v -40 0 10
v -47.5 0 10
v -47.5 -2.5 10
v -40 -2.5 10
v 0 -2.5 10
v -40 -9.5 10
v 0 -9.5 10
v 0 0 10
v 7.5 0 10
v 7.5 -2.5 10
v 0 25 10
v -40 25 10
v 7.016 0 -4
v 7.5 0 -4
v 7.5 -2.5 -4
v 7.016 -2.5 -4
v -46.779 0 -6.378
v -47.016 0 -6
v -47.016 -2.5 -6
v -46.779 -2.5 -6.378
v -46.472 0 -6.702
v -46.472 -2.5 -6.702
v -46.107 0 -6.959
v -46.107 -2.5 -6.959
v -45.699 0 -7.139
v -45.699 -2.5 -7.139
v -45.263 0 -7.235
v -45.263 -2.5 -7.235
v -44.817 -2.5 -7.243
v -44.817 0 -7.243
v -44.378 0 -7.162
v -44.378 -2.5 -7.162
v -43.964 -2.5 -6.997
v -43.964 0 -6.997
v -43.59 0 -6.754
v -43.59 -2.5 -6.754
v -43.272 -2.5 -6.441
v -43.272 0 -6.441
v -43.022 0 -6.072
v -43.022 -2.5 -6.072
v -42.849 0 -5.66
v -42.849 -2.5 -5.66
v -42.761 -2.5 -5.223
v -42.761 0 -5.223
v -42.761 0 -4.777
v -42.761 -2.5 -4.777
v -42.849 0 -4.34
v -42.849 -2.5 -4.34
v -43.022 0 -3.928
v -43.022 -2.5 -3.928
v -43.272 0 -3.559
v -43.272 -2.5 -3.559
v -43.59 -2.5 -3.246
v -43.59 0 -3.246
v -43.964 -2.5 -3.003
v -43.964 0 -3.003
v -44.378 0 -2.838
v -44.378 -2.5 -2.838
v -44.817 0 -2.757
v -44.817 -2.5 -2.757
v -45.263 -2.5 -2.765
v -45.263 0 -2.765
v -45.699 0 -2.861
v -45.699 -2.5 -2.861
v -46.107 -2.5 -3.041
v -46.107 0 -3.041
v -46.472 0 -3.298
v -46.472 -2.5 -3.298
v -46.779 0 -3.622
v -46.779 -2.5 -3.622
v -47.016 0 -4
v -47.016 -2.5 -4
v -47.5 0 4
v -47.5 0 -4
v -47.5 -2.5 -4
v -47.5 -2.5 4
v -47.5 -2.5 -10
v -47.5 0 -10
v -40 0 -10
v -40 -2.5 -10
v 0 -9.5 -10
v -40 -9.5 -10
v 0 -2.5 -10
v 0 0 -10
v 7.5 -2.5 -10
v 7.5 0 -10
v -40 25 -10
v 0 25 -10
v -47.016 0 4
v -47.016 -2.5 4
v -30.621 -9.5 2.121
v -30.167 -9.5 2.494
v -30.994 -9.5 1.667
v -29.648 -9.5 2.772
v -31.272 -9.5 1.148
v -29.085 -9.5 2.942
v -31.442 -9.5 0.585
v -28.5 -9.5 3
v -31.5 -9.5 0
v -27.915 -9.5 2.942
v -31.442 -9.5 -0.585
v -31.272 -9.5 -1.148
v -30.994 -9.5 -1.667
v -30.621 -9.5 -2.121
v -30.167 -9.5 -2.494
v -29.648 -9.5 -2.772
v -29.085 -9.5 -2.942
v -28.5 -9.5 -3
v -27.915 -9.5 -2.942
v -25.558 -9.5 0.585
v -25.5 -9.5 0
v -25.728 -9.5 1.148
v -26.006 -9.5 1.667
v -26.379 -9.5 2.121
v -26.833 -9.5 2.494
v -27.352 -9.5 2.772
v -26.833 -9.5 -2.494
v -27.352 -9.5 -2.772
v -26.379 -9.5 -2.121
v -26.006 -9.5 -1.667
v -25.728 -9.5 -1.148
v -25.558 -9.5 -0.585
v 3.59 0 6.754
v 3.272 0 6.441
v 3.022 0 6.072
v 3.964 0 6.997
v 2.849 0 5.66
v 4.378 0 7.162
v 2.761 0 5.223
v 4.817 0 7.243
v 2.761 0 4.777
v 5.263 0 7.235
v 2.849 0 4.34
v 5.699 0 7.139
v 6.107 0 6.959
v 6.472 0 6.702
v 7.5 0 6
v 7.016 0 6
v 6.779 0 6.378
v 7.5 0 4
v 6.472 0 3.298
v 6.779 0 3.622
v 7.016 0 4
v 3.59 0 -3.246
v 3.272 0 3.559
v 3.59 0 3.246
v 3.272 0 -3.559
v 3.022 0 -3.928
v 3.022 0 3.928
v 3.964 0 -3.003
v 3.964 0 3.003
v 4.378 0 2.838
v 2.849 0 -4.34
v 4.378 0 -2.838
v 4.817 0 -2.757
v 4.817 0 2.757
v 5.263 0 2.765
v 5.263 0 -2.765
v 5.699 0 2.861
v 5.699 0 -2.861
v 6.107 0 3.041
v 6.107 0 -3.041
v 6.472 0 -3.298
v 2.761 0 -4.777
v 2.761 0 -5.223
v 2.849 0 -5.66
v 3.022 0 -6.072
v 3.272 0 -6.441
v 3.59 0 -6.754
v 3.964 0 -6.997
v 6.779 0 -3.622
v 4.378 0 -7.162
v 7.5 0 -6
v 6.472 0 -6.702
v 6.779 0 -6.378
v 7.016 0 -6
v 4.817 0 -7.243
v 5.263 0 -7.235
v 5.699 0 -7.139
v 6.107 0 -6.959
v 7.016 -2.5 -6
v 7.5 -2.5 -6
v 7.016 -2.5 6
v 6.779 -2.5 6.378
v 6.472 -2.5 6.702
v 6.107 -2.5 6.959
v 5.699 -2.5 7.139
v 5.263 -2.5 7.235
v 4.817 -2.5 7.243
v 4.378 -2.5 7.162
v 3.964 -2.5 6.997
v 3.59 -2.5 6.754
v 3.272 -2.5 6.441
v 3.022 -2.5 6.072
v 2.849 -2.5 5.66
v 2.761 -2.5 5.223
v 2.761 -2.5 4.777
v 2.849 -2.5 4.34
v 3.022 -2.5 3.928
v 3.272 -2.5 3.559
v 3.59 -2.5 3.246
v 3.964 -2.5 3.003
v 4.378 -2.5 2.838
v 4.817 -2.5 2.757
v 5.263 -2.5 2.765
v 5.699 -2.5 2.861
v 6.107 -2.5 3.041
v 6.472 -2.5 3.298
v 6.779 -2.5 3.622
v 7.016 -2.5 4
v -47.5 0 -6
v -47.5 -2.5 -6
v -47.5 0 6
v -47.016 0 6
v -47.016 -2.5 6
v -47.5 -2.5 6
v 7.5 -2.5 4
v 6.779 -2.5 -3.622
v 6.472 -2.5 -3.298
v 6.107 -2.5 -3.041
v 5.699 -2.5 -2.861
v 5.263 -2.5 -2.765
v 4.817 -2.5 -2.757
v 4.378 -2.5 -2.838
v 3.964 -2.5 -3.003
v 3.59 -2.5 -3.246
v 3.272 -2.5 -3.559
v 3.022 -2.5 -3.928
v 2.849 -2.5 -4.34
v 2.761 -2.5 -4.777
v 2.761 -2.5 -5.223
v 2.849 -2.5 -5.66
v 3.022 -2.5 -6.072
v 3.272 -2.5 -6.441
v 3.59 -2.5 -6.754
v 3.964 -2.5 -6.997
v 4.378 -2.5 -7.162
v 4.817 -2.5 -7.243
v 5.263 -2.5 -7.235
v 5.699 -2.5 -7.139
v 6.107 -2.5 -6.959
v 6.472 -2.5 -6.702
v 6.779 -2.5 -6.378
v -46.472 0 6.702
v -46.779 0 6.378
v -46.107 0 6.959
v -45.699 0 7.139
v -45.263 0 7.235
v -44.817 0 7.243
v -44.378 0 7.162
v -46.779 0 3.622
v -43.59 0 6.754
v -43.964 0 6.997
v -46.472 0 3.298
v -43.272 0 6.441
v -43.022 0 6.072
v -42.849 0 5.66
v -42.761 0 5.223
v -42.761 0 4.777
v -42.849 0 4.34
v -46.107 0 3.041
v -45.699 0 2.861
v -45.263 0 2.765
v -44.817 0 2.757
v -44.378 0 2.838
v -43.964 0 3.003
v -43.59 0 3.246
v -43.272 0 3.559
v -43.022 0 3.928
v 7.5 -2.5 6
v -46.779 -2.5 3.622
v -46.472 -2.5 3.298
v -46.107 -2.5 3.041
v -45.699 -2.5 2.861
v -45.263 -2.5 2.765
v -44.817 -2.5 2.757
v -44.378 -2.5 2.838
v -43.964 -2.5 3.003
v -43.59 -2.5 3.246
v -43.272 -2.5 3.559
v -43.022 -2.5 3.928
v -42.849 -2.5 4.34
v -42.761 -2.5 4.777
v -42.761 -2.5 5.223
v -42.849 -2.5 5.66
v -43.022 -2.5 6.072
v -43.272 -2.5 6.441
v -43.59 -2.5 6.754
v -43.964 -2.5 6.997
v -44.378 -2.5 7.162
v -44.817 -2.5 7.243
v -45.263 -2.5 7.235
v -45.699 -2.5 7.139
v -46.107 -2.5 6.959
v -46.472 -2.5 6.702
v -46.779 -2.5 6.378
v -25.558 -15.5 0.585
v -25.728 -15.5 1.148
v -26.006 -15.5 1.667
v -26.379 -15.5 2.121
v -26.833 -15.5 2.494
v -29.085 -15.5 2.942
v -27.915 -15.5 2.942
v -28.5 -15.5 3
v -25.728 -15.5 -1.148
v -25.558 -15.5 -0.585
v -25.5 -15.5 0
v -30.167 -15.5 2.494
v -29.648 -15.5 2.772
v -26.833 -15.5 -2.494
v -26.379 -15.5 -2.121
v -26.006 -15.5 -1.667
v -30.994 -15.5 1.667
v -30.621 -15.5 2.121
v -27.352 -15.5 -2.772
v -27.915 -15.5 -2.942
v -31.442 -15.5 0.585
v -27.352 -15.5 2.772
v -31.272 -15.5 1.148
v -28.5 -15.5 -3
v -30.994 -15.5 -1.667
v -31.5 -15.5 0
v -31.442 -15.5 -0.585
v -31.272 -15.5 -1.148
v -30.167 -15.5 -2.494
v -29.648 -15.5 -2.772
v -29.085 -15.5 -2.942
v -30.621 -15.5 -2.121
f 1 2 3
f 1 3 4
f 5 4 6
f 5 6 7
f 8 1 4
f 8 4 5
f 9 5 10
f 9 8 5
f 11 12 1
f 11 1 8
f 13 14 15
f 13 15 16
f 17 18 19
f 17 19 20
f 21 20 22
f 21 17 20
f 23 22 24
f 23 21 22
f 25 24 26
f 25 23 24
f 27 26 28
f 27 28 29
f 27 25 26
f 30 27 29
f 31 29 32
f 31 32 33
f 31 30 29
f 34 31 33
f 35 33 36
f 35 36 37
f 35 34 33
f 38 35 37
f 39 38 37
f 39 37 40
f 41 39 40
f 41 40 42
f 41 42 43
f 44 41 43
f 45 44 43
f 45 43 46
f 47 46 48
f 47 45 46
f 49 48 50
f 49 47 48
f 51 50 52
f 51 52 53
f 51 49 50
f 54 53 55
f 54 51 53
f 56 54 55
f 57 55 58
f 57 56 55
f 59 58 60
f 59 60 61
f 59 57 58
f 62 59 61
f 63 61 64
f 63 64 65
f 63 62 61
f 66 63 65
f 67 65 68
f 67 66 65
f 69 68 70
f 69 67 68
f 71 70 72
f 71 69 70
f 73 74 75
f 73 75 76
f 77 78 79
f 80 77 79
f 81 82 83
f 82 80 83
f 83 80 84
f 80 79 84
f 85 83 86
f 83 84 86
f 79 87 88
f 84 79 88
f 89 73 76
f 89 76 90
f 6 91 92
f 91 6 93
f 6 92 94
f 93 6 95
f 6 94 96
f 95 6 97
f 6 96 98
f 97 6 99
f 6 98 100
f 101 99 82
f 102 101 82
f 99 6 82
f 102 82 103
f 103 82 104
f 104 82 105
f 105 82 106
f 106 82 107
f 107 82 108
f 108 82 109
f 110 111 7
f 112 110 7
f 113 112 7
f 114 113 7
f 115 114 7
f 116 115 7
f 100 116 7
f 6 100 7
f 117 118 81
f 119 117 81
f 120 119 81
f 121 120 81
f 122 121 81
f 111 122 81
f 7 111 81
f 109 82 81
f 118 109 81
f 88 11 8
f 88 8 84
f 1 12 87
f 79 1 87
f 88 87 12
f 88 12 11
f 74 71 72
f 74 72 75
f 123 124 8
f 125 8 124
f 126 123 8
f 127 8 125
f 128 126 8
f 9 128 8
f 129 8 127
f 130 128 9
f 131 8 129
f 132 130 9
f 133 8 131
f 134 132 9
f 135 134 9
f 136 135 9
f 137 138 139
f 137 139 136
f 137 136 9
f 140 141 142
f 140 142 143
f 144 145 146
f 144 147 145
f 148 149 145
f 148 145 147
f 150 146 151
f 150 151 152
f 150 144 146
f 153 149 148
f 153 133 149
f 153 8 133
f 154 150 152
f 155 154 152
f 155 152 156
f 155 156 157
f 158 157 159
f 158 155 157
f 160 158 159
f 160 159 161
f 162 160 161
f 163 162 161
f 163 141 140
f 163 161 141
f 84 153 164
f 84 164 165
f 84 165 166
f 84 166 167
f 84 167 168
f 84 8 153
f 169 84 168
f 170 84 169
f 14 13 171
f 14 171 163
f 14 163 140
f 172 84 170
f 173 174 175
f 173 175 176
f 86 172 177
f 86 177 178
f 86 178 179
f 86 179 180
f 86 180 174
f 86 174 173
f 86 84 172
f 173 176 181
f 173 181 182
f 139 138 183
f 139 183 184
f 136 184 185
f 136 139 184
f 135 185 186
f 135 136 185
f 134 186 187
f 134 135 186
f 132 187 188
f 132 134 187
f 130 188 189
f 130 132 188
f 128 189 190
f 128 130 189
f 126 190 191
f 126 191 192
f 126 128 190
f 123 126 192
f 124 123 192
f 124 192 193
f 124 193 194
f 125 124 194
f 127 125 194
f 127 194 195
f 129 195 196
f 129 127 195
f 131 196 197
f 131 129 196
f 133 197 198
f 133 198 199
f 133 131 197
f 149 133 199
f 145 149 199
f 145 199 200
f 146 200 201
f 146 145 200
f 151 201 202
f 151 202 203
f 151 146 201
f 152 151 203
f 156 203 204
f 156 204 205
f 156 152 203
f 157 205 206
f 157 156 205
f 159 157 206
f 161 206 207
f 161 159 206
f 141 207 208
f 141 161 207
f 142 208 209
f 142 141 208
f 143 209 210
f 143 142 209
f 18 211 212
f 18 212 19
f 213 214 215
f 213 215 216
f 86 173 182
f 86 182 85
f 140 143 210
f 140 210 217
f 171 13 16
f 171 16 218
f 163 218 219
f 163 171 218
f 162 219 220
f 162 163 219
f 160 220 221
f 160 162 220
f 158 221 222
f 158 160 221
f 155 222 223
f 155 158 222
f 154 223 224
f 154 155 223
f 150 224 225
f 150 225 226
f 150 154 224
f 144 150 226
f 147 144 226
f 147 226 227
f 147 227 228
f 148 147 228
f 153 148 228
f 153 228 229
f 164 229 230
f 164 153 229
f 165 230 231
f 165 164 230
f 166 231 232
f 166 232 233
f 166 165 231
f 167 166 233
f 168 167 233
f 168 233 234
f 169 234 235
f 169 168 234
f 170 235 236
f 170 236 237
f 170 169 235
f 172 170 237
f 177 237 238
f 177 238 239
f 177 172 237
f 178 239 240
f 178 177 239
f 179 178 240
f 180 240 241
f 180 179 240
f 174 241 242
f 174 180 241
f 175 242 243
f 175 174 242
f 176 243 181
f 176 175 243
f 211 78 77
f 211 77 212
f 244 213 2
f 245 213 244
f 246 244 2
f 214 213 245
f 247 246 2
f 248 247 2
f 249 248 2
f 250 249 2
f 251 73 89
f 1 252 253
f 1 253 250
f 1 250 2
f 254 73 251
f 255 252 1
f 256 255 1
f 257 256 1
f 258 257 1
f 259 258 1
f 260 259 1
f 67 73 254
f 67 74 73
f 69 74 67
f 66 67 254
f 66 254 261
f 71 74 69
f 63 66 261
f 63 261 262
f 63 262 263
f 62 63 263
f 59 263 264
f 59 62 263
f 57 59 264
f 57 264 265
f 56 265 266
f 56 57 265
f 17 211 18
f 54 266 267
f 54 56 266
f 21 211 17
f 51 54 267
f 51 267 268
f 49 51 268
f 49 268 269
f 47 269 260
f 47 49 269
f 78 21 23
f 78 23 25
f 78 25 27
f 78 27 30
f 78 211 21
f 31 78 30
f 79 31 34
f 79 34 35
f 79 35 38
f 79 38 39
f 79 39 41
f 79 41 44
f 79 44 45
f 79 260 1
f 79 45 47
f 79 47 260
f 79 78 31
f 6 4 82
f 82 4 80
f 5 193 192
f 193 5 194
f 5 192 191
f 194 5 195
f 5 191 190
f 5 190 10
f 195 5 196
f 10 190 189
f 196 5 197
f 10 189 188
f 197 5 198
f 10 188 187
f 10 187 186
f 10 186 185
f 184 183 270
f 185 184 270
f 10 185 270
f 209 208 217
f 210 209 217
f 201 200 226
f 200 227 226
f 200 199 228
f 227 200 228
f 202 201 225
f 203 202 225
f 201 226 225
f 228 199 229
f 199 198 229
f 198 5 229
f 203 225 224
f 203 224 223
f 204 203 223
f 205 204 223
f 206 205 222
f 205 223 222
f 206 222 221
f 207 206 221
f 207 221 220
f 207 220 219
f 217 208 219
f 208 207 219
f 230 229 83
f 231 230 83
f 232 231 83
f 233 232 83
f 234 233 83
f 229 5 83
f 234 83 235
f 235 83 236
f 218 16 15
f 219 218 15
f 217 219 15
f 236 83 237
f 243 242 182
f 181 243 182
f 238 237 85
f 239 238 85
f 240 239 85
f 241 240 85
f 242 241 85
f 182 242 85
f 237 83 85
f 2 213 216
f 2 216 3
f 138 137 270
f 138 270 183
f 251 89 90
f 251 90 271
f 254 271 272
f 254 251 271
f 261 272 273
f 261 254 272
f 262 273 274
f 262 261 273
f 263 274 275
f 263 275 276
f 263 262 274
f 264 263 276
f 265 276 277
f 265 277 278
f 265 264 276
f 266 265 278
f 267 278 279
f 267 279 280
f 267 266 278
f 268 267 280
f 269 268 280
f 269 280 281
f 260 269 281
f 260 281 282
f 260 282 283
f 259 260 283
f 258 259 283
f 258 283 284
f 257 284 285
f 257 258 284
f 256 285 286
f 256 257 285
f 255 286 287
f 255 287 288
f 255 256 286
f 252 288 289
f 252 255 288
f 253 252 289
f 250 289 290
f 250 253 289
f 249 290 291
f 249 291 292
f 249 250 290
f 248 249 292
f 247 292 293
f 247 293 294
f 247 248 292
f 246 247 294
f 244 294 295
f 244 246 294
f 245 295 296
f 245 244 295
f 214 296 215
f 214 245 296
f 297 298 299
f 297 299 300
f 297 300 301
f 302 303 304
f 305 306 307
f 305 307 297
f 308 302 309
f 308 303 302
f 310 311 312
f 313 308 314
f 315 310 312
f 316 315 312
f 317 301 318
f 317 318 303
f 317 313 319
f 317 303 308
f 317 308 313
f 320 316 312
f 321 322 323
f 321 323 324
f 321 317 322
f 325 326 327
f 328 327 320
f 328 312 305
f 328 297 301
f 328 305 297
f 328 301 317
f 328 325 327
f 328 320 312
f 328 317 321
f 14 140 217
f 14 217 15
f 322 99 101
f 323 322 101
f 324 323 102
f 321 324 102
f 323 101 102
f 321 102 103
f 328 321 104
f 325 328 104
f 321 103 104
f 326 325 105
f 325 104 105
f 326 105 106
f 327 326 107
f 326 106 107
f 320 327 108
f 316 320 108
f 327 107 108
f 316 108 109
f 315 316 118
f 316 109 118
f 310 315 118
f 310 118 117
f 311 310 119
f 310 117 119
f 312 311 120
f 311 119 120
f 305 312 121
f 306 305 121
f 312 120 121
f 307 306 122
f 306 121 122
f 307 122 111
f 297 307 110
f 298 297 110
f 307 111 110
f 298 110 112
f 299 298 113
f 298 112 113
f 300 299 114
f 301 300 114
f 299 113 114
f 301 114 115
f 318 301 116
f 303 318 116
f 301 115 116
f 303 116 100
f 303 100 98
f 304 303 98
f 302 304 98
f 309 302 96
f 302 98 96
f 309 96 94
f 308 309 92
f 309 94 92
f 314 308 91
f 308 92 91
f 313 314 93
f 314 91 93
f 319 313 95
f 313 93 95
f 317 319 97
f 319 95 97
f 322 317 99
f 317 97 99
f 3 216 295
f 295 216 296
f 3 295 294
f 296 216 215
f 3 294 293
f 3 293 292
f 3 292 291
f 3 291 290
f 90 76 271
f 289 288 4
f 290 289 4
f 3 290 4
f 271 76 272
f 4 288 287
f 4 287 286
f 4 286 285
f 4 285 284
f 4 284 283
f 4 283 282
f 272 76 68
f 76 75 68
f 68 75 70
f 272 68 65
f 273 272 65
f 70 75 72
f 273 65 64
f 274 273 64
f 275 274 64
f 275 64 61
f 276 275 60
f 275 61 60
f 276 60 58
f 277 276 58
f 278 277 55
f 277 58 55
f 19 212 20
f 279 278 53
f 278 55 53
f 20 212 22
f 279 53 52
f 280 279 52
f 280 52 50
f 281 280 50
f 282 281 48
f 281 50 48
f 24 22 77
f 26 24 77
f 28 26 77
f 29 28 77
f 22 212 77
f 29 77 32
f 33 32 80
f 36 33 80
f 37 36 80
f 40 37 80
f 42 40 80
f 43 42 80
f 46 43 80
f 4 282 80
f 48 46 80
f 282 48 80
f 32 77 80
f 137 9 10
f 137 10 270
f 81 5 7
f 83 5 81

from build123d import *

# Parameters (mm, degrees)
SKETCH1_W                = 40
SKETCH1_H                = 20
BOSS_EXTRUDE1_DEPTH      = 25
BOSS_EXTRUDE1_DEPTH_BACK = 9.5
BOSS_EXTRUDE2_DEPTH      = 2.5
SKETCH3_R                = 3
BOSS_EXTRUDE3_DEPTH      = 6


with BuildPart() as part:
    # Sketch1 → Boss-Extrude1 (new body, two sides)
    with BuildSketch(Plane(origin=(0, 0, 0), x_dir=(1, 0, 0), z_dir=(0, 1, 0))) as boss_extrude1_sk:
        with Locations((-20, 0)):
            Rectangle(SKETCH1_W, SKETCH1_H)
    extrude(amount=BOSS_EXTRUDE1_DEPTH)
    extrude(boss_extrude1_sk.sketch, amount=-BOSS_EXTRUDE1_DEPTH_BACK)

    # Sketch2 → Boss-Extrude2 (add)
    with BuildSketch(Plane(origin=(0, 0, 0), x_dir=(1, 0, 0), z_dir=(0, 1, 0))):
        with BuildLine():
            Line((-40, 10), (-47.5, 10))
            Line((-47.5, 10), (-47.5, 6))
            Line((-47.5, 6), (-47.015564437, 6))
            ThreePointArc((-47.015564437, 6), (-42.75, 5), (-47.015564437, 4))
            Line((-47.015564437, 4), (-47.5, 4))
            Line((-47.5, 4), (-47.5, -4))
            Line((-47.5, -4), (-47.015564437, -4))
            ThreePointArc((-47.015564437, -4), (-42.75, -5), (-47.015564437, -6))
            Line((-47.015564437, -6), (-47.5, -6))
            Line((-47.5, -6), (-47.5, -10))
            Line((-47.5, -10), (-40, -10))
            Line((-40, -10), (-40, 10))
        make_face()
        with BuildLine():
            Line((7.5, -4), (7.5, 4))
            Line((7.5, 4), (7.015564437, 4))
            ThreePointArc((7.015564437, 4), (2.75, 5), (7.015564437, 6))
            Line((7.015564437, 6), (7.5, 6))
            Line((7.5, 6), (7.5, 10))
            Line((7.5, 10), (0, 10))
            Line((0, 10), (0, -10))
            Line((0, -10), (7.5, -10))
            Line((7.5, -10), (7.5, -6))
            Line((7.5, -6), (7.015564437, -6))
            ThreePointArc((7.015564437, -6), (2.75, -5), (7.015564437, -4))
            Line((7.015564437, -4), (7.5, -4))
        make_face()
    extrude(amount=-BOSS_EXTRUDE2_DEPTH)

    # Sketch3 → Boss-Extrude3 (add)
    with BuildSketch(Plane(origin=(0, -9.5, 0), x_dir=(-1, 0, 0), z_dir=(0, -1, 0))):
        with Locations((28.5, 0)):
            Circle(SKETCH3_R)
    extrude(amount=BOSS_EXTRUDE3_DEPTH)


solid = part.part
